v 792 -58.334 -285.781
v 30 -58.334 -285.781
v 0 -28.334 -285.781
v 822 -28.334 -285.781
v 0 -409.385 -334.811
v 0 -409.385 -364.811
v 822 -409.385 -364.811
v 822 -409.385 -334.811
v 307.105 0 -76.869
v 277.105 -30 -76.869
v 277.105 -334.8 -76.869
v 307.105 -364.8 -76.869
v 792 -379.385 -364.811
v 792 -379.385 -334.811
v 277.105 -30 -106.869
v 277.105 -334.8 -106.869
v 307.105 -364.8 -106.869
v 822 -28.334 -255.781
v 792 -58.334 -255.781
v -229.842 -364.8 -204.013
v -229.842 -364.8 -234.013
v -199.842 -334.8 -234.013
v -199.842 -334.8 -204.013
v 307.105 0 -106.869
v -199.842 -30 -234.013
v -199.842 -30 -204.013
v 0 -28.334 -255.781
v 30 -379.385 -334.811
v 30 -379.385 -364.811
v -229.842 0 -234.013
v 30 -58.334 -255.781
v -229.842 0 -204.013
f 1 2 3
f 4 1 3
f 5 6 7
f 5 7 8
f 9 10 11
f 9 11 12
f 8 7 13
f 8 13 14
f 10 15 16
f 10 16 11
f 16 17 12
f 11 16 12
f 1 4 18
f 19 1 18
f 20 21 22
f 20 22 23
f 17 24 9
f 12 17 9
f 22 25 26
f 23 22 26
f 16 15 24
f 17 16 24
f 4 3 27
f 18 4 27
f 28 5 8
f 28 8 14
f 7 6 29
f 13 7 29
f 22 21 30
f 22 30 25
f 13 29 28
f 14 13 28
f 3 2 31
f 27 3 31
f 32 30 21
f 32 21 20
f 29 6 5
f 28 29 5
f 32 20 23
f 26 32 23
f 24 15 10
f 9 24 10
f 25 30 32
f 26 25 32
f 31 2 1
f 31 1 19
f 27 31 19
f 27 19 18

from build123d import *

# Parameters (mm, degrees)
F0_W      = 30
F0_H      = 30
F1_DEPTH  = 822
F2_W      = 30
F2_H      = 30
F3_DEPTH  = 364.8
F4_W      = 30
F4_H      = 30
F5_DEPTH  = 822
F6_W      = 30
F6_H      = 30
F7_DEPTH  = 364.8
F8_SIZE   = 29.99999
F8_2_SIZE = 29.99999
F8_3_SIZE = 29.99999
F8_4_SIZE = 29.99999


# Not quite as in the source:
# - a fillet or chamfer is up to 0.001 mm smaller than in the source, because OpenCascade refuses the exact size


with BuildPart() as f1:
    # F0 (on Right) → F1 (new body)
    with BuildSketch(Plane.YZ):
        with Locations((-43.334082365, -270.7813239098)):
            Rectangle(F0_W, F0_H)
    extrude(amount=F1_DEPTH)

    # F8#4 (size 30 in the source; OpenCascade refuses exactly that, so slightly less here)
    f8_4_edges = [f1.edges().sort_by_distance(p)[0] for p in [
        (822, -58.334082, -270.781324),
        (0, -58.334082, -270.781324),
    ]]
    chamfer(f8_4_edges, length=F8_4_SIZE)


with BuildPart() as f3:
    # F2 (on Front) → F3 (new body)
    with BuildSketch(Plane.XZ):
        with Locations((-214.8419408661, -219.0126031637)):
            Rectangle(F2_W, F2_H)
    extrude(amount=F3_DEPTH)

    # F8#2 (size 30 in the source; OpenCascade refuses exactly that, so slightly less here)
    f8_2_edges = [f3.edges().sort_by_distance(p)[0] for p in [
        (-199.841941, 0, -219.012603),
        (-199.841941, -364.8, -219.012603),
    ]]
    chamfer(f8_2_edges, length=F8_2_SIZE)


with BuildPart() as f5:
    # F4 (on Right) → F5 (new body)
    with BuildSketch(Plane.YZ):
        with Locations((-394.3848624069, -349.8105704784)):
            Rectangle(F4_W, F4_H)
    extrude(amount=F5_DEPTH)

    # F8#3 (size 30 in the source; OpenCascade refuses exactly that, so slightly less here)
    f8_3_edges = [f5.edges().sort_by_distance(p)[0] for p in [
        (0, -379.384862, -349.81057),
        (822, -379.384862, -349.81057),
    ]]
    chamfer(f8_3_edges, length=F8_3_SIZE)


with BuildPart() as f7:
    # F6 (on Front) → F7 (new body)
    with BuildSketch(Plane.XZ):
        with Locations((292.1046539125, -91.8692350388)):
            Rectangle(F6_W, F6_H)
    extrude(amount=F7_DEPTH)

    # F8 (size 30 in the source; OpenCascade refuses exactly that, so slightly less here)
    f8_edges = [f7.edges().sort_by_distance(p)[0] for p in [
        (277.104654, 0, -91.869235),
        (277.104654, -364.8, -91.869235),
    ]]
    chamfer(f8_edges, length=F8_SIZE)


solid = Compound([f1.part, f3.part, f5.part, f7.part])
